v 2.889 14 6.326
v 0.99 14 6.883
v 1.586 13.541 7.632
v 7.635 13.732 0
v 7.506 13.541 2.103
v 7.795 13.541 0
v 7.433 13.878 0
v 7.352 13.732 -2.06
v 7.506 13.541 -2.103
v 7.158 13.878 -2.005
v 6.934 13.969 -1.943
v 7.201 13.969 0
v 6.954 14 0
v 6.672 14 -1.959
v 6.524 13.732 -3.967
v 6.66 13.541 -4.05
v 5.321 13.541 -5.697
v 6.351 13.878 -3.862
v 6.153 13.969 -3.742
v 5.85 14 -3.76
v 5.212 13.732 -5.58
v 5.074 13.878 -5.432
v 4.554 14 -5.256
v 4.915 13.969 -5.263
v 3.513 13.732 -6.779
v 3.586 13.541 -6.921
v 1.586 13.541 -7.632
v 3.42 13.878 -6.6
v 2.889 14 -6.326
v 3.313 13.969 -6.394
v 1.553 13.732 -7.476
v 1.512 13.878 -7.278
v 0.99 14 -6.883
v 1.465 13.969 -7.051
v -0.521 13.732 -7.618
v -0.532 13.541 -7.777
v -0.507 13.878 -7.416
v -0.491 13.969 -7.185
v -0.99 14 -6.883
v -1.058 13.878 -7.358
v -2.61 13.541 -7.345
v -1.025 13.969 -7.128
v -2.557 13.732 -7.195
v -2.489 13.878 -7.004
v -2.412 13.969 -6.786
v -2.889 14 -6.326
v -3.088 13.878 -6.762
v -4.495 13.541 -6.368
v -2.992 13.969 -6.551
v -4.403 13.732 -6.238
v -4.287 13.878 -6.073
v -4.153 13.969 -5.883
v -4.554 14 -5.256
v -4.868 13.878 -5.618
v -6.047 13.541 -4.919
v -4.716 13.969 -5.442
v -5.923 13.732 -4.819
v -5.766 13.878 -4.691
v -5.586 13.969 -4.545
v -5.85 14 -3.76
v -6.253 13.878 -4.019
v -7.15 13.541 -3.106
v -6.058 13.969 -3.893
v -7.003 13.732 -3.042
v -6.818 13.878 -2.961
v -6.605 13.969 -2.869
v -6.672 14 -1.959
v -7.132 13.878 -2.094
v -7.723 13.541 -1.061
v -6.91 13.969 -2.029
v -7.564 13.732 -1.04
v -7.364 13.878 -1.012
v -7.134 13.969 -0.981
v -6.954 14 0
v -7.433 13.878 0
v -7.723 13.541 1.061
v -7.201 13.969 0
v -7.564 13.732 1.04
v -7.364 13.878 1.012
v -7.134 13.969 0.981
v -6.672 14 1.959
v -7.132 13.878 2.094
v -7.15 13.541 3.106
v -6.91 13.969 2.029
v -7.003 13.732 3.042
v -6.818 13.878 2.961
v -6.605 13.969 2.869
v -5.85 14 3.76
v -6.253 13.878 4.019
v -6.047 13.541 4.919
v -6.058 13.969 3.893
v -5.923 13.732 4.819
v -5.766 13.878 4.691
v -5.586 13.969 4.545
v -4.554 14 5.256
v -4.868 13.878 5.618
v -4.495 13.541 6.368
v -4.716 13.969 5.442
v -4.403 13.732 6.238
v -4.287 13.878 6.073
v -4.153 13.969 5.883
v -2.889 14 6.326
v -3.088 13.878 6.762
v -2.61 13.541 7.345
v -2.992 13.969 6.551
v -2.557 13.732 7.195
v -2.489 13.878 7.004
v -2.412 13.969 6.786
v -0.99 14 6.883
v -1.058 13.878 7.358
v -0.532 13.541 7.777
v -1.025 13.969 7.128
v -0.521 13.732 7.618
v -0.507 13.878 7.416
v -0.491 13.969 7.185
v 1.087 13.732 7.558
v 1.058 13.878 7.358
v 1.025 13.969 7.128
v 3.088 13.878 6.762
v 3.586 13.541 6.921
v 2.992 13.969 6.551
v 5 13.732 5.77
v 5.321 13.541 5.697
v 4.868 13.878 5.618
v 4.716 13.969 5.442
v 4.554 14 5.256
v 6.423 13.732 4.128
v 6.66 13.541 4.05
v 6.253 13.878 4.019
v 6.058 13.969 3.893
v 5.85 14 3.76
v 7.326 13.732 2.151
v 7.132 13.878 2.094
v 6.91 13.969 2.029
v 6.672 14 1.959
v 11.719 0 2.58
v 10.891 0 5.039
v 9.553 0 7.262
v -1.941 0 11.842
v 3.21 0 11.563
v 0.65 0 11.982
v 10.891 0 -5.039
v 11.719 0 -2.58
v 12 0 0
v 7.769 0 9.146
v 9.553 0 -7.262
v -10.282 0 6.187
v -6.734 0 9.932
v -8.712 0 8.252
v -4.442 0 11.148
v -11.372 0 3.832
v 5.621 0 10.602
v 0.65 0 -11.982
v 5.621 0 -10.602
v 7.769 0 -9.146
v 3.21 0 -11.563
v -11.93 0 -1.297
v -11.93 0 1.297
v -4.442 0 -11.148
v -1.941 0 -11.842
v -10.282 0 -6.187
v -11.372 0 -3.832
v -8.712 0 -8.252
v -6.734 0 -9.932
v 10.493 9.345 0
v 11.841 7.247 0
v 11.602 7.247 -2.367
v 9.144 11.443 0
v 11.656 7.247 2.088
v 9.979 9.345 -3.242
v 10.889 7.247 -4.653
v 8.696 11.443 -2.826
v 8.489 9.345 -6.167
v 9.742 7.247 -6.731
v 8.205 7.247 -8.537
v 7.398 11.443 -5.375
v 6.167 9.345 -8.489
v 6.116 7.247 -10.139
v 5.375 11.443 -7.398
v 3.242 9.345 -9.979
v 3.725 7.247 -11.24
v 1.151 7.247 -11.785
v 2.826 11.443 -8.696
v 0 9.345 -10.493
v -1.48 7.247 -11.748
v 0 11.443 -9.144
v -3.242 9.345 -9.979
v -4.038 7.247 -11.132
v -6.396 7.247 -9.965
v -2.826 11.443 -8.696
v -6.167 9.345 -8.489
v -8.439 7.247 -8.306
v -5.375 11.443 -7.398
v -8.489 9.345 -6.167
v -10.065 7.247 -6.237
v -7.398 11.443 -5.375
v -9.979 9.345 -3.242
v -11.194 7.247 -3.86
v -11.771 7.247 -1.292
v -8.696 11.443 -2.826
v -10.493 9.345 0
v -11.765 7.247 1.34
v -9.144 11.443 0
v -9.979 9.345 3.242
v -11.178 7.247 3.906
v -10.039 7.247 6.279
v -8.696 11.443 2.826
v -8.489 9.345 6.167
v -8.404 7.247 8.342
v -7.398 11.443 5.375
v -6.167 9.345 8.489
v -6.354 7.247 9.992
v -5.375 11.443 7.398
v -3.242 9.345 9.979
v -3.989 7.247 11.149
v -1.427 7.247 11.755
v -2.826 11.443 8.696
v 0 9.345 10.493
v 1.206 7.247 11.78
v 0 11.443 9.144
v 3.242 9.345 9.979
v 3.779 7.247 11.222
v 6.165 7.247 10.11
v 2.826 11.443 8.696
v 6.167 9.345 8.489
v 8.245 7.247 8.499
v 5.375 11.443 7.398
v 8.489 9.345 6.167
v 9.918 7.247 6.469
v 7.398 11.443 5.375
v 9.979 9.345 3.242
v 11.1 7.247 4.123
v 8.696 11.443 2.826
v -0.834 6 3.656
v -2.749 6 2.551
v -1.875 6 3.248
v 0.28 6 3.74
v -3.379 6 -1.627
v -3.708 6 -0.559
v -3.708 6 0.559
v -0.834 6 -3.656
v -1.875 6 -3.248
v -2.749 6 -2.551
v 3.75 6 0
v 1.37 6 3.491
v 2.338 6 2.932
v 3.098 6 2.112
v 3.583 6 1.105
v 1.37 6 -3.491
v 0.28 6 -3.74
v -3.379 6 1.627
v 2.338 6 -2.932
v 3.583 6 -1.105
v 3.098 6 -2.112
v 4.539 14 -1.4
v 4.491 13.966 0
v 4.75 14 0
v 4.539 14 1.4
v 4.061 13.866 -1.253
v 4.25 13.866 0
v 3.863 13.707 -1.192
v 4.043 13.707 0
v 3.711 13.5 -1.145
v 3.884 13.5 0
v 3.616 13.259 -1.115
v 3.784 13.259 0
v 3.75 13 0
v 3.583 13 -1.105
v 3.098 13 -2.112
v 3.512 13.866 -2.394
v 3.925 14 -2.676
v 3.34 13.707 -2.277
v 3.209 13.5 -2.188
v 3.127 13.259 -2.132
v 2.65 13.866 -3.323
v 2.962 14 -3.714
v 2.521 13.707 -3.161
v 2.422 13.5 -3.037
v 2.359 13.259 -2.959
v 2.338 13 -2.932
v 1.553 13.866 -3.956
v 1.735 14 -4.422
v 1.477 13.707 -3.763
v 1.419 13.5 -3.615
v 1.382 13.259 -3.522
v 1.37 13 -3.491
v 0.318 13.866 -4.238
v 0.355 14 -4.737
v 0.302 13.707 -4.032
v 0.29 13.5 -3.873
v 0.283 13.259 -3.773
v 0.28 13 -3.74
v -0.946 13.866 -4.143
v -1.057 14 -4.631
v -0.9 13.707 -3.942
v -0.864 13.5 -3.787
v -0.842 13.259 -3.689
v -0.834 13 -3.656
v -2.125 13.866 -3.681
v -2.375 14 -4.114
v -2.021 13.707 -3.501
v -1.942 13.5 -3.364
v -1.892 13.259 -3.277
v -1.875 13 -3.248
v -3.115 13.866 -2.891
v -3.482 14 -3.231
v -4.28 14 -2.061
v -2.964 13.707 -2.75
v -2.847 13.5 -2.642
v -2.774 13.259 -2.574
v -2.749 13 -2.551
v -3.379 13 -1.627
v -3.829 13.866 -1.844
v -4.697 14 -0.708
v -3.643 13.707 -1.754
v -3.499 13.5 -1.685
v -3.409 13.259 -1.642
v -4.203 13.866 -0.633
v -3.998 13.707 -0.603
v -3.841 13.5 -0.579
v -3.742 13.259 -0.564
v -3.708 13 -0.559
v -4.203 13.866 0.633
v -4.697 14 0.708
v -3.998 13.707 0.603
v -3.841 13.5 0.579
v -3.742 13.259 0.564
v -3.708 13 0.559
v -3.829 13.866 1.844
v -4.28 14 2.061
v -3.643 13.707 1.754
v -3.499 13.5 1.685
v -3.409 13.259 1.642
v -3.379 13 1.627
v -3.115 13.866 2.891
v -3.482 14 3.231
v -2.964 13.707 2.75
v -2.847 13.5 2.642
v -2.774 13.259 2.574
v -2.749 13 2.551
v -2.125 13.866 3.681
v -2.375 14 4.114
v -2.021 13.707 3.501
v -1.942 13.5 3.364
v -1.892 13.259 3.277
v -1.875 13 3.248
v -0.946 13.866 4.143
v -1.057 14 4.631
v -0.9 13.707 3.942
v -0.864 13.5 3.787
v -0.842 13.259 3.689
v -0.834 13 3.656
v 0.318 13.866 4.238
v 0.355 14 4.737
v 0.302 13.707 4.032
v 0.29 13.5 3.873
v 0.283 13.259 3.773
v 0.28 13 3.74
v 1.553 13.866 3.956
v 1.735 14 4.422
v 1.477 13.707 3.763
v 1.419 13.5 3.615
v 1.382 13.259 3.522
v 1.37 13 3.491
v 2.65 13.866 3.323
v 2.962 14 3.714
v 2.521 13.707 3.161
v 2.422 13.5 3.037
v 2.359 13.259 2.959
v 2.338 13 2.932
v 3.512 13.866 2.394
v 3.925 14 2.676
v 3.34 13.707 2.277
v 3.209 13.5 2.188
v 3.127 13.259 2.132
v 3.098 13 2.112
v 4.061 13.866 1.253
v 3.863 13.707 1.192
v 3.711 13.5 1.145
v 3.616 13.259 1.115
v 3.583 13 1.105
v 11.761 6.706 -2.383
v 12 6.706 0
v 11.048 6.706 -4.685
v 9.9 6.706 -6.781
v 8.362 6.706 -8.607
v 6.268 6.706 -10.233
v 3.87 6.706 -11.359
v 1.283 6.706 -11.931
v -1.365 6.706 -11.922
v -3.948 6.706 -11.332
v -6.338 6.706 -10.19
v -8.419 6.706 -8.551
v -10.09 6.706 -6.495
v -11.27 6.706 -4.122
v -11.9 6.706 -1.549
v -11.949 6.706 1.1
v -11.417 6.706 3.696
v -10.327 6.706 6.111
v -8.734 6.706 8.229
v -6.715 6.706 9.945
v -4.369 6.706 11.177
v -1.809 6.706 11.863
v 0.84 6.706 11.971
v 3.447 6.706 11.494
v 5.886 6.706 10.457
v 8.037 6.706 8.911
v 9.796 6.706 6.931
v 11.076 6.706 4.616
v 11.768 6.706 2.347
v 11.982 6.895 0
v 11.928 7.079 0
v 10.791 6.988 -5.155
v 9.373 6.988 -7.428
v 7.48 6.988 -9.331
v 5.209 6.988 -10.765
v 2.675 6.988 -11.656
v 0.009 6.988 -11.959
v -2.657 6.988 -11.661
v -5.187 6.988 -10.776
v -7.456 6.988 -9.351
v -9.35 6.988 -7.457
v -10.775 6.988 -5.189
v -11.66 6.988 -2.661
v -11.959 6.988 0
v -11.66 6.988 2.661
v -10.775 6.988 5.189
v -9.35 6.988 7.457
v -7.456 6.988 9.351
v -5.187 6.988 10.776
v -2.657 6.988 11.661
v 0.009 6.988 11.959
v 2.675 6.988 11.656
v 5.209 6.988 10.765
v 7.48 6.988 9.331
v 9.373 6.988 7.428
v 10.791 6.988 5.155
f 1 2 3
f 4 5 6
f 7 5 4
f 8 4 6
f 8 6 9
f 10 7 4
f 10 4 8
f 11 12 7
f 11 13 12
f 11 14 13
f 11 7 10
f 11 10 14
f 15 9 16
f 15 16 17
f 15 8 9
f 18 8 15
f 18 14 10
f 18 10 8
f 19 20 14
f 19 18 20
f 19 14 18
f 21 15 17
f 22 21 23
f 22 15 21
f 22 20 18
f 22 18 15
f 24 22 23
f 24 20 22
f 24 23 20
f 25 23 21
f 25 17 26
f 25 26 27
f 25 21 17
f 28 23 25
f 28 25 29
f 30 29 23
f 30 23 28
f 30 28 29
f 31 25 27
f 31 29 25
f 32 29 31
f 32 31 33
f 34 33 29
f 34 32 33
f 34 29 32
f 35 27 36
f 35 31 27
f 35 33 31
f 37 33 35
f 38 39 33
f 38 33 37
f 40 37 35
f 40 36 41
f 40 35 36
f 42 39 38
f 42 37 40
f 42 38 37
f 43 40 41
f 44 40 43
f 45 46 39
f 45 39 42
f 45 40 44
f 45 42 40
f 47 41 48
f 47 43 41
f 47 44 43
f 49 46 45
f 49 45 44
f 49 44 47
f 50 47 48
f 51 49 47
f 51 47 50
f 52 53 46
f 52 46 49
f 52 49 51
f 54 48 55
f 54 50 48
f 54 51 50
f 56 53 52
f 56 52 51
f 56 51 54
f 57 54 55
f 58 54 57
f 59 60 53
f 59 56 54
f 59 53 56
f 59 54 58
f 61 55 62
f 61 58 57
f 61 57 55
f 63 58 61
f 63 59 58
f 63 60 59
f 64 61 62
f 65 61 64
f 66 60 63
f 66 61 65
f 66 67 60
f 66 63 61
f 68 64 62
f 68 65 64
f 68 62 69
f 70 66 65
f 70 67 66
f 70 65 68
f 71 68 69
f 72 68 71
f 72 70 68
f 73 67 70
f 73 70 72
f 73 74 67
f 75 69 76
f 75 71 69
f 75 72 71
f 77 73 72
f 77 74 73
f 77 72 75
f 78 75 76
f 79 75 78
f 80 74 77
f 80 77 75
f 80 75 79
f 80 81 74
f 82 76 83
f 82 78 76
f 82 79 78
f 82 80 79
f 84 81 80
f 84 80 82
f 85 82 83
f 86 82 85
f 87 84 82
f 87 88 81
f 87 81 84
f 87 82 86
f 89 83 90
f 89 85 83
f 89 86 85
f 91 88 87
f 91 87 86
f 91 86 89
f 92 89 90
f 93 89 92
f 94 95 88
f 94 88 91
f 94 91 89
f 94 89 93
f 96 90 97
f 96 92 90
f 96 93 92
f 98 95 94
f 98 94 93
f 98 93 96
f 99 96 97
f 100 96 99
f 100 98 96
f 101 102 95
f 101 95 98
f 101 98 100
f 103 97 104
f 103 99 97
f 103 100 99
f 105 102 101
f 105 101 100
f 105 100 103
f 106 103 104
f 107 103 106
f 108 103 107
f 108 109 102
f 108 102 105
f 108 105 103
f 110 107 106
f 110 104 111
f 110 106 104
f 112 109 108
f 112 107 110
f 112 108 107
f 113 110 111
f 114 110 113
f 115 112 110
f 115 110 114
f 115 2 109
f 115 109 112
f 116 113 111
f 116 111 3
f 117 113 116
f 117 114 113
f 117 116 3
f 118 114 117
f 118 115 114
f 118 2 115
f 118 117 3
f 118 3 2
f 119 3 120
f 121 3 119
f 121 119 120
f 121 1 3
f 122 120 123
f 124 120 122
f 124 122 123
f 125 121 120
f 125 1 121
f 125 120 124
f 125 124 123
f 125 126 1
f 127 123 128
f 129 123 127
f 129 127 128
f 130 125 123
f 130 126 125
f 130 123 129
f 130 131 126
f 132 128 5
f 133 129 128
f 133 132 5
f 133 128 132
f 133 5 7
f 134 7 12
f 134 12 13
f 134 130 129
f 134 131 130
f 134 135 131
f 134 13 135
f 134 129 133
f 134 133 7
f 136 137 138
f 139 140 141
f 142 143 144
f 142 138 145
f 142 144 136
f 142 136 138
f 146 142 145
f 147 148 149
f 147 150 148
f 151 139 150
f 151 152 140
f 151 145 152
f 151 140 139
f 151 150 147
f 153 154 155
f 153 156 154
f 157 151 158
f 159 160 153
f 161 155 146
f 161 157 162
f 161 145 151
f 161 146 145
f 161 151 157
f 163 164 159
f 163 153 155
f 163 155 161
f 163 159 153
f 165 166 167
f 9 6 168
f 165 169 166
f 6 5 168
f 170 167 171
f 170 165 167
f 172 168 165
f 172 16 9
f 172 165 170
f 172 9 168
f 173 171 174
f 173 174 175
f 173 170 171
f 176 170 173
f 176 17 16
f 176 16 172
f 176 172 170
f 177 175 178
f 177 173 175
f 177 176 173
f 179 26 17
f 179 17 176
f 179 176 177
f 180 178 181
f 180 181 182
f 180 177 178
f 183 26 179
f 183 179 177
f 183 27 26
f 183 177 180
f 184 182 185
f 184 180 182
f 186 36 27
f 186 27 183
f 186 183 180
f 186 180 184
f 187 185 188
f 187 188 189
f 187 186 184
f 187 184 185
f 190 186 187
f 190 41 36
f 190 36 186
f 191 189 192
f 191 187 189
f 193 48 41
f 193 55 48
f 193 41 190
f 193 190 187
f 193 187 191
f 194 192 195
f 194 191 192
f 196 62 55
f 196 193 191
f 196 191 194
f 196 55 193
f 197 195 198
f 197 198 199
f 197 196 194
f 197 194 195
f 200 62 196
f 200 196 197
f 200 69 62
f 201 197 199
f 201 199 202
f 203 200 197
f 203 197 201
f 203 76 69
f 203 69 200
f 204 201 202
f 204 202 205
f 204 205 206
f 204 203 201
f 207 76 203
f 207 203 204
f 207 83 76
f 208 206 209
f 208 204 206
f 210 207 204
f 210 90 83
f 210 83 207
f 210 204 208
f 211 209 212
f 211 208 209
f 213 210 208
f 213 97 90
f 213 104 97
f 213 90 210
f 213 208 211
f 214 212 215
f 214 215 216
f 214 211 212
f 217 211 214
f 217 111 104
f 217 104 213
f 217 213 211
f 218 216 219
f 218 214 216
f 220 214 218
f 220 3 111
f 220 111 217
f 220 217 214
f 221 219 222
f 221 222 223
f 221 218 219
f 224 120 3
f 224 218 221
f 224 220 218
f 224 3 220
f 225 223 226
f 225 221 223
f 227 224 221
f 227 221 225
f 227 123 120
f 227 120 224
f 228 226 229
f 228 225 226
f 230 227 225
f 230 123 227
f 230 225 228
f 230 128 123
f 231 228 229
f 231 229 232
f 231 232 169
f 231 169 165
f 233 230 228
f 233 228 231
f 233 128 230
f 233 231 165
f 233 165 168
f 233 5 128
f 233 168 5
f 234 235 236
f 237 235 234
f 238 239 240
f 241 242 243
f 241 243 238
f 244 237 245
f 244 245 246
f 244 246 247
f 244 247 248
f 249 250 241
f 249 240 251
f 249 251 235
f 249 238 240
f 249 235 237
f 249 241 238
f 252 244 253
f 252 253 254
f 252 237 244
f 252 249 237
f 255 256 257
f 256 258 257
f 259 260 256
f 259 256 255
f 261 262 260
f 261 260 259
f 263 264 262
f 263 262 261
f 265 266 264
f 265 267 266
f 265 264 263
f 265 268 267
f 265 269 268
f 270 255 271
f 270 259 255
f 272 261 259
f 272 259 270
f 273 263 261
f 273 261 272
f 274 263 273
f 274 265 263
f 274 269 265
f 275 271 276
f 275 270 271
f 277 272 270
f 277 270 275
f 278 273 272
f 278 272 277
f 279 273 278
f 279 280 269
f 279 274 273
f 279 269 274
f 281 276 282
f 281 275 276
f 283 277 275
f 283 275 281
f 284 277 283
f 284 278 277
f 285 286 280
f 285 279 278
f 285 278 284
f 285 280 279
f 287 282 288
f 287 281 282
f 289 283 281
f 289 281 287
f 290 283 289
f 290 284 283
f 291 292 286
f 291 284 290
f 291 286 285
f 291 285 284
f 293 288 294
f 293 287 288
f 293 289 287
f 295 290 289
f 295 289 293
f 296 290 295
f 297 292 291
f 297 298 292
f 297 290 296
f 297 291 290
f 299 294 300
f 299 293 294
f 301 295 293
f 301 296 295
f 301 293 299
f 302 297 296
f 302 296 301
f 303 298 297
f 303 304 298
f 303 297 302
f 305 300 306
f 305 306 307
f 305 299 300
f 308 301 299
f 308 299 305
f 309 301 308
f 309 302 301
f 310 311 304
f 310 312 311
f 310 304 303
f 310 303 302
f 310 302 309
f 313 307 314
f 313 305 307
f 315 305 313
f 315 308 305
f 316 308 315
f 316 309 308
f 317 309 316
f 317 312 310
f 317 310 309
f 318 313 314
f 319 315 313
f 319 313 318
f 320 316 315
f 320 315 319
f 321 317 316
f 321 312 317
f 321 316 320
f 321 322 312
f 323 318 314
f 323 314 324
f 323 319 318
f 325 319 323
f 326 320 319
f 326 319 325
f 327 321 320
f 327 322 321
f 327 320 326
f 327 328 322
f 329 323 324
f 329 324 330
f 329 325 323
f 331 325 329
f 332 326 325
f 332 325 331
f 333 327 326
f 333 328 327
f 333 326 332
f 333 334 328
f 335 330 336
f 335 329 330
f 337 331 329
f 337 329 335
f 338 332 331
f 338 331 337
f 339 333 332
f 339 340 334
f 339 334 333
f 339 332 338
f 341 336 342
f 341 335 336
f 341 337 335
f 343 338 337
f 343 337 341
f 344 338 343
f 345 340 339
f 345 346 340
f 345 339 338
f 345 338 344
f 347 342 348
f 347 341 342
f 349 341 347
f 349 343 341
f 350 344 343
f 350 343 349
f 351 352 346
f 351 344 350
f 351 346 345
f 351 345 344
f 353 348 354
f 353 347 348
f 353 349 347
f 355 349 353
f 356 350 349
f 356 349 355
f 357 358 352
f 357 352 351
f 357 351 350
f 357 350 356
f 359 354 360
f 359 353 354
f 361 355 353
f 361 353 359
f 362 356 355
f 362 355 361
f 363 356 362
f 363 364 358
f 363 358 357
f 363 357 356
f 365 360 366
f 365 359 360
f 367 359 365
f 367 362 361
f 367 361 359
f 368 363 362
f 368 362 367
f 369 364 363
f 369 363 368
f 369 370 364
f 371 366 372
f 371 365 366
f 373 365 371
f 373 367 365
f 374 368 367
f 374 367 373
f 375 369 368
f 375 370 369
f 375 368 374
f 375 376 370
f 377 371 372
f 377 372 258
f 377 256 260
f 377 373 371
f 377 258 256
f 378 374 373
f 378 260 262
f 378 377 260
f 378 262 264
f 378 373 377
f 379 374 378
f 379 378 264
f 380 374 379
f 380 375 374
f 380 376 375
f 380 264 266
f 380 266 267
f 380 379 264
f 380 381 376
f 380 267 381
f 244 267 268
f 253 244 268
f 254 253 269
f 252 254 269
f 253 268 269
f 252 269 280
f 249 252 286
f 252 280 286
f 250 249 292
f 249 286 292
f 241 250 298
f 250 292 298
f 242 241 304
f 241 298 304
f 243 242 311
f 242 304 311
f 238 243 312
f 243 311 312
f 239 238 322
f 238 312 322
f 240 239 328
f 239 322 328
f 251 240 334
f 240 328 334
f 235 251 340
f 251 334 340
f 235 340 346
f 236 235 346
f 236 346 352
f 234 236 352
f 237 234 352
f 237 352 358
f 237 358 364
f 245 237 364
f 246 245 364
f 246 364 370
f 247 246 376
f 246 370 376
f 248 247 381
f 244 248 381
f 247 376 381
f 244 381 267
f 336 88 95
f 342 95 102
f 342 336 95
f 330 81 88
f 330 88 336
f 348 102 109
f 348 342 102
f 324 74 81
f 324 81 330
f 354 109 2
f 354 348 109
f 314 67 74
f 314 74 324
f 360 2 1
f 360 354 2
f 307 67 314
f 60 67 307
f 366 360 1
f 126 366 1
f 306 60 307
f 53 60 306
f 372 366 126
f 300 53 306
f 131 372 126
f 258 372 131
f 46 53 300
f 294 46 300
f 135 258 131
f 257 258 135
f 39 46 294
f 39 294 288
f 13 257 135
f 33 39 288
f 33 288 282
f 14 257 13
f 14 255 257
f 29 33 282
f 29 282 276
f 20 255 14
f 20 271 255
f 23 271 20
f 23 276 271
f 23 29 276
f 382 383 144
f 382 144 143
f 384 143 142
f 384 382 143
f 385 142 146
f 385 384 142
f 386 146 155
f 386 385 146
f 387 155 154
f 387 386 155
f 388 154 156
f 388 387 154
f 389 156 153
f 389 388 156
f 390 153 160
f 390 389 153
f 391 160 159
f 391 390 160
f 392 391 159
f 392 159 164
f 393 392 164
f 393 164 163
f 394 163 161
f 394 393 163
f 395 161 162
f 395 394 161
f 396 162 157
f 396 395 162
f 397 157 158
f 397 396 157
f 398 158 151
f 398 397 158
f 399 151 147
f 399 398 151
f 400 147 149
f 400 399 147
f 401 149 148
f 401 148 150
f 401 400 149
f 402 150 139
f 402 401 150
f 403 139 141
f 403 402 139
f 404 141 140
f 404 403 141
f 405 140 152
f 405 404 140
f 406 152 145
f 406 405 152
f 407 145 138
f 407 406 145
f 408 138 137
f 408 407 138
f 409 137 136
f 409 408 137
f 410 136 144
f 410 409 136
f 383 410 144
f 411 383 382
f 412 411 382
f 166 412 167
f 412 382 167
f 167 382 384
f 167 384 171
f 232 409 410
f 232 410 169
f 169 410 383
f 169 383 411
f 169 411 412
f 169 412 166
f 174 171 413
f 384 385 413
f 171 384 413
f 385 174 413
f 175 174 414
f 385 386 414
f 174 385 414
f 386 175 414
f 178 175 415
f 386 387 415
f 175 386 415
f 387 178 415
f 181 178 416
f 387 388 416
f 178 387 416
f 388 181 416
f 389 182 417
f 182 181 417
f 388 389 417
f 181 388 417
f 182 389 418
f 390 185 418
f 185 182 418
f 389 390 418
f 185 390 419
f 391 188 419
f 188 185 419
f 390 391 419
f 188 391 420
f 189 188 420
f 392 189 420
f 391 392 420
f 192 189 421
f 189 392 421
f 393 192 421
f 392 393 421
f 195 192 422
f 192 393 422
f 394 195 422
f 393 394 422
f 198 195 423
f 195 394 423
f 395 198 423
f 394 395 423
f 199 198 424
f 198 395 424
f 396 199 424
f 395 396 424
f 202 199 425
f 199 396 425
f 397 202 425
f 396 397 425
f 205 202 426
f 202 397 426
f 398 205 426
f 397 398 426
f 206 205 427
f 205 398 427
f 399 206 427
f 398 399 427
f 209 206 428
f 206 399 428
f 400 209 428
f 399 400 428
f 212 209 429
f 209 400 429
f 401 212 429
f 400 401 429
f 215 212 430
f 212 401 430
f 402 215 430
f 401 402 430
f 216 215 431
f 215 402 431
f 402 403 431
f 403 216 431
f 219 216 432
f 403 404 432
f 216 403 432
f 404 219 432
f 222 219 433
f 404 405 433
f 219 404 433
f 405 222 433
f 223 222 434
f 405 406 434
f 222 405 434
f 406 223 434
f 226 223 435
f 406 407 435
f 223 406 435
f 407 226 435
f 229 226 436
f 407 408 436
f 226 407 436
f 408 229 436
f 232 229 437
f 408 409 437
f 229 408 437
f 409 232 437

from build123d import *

# Parameters (mm, degrees)
SCHIZZO2_R               = 3.75
TAGLIO_ESTRUSIONE1_DEPTH = 8
FILLET1_R                = 1


with BuildPart() as part:
    # Schizzo1 → Rivoluzione1 (revolve)
    with BuildSketch(Plane.XY):
        Polygon((0, 0), (12, 0), (12, 7), (7.5, 14), (0, 14), align=None)
    revolve(axis=Axis((0, -9.987677887, 0), (0, 1, 0)))

    # Schizzo2 → Taglio-Estrusione1 (cut)
    with BuildSketch(Plane(origin=(0, 14, 0), x_dir=(1, 0, 0), z_dir=(0, 1, 0))):
        Circle(SCHIZZO2_R)
    extrude(amount=-TAGLIO_ESTRUSIONE1_DEPTH, mode=Mode.SUBTRACT)

    # Fillet1
    fillet1_edges = [part.edges().sort_by_distance(p)[0] for p in [
        (-3.75, 14, 0),
        (-7.5, 14, 0),
        (-12, 7, 0),
    ]]
    fillet(fillet1_edges, radius=FILLET1_R)


solid = part.part
